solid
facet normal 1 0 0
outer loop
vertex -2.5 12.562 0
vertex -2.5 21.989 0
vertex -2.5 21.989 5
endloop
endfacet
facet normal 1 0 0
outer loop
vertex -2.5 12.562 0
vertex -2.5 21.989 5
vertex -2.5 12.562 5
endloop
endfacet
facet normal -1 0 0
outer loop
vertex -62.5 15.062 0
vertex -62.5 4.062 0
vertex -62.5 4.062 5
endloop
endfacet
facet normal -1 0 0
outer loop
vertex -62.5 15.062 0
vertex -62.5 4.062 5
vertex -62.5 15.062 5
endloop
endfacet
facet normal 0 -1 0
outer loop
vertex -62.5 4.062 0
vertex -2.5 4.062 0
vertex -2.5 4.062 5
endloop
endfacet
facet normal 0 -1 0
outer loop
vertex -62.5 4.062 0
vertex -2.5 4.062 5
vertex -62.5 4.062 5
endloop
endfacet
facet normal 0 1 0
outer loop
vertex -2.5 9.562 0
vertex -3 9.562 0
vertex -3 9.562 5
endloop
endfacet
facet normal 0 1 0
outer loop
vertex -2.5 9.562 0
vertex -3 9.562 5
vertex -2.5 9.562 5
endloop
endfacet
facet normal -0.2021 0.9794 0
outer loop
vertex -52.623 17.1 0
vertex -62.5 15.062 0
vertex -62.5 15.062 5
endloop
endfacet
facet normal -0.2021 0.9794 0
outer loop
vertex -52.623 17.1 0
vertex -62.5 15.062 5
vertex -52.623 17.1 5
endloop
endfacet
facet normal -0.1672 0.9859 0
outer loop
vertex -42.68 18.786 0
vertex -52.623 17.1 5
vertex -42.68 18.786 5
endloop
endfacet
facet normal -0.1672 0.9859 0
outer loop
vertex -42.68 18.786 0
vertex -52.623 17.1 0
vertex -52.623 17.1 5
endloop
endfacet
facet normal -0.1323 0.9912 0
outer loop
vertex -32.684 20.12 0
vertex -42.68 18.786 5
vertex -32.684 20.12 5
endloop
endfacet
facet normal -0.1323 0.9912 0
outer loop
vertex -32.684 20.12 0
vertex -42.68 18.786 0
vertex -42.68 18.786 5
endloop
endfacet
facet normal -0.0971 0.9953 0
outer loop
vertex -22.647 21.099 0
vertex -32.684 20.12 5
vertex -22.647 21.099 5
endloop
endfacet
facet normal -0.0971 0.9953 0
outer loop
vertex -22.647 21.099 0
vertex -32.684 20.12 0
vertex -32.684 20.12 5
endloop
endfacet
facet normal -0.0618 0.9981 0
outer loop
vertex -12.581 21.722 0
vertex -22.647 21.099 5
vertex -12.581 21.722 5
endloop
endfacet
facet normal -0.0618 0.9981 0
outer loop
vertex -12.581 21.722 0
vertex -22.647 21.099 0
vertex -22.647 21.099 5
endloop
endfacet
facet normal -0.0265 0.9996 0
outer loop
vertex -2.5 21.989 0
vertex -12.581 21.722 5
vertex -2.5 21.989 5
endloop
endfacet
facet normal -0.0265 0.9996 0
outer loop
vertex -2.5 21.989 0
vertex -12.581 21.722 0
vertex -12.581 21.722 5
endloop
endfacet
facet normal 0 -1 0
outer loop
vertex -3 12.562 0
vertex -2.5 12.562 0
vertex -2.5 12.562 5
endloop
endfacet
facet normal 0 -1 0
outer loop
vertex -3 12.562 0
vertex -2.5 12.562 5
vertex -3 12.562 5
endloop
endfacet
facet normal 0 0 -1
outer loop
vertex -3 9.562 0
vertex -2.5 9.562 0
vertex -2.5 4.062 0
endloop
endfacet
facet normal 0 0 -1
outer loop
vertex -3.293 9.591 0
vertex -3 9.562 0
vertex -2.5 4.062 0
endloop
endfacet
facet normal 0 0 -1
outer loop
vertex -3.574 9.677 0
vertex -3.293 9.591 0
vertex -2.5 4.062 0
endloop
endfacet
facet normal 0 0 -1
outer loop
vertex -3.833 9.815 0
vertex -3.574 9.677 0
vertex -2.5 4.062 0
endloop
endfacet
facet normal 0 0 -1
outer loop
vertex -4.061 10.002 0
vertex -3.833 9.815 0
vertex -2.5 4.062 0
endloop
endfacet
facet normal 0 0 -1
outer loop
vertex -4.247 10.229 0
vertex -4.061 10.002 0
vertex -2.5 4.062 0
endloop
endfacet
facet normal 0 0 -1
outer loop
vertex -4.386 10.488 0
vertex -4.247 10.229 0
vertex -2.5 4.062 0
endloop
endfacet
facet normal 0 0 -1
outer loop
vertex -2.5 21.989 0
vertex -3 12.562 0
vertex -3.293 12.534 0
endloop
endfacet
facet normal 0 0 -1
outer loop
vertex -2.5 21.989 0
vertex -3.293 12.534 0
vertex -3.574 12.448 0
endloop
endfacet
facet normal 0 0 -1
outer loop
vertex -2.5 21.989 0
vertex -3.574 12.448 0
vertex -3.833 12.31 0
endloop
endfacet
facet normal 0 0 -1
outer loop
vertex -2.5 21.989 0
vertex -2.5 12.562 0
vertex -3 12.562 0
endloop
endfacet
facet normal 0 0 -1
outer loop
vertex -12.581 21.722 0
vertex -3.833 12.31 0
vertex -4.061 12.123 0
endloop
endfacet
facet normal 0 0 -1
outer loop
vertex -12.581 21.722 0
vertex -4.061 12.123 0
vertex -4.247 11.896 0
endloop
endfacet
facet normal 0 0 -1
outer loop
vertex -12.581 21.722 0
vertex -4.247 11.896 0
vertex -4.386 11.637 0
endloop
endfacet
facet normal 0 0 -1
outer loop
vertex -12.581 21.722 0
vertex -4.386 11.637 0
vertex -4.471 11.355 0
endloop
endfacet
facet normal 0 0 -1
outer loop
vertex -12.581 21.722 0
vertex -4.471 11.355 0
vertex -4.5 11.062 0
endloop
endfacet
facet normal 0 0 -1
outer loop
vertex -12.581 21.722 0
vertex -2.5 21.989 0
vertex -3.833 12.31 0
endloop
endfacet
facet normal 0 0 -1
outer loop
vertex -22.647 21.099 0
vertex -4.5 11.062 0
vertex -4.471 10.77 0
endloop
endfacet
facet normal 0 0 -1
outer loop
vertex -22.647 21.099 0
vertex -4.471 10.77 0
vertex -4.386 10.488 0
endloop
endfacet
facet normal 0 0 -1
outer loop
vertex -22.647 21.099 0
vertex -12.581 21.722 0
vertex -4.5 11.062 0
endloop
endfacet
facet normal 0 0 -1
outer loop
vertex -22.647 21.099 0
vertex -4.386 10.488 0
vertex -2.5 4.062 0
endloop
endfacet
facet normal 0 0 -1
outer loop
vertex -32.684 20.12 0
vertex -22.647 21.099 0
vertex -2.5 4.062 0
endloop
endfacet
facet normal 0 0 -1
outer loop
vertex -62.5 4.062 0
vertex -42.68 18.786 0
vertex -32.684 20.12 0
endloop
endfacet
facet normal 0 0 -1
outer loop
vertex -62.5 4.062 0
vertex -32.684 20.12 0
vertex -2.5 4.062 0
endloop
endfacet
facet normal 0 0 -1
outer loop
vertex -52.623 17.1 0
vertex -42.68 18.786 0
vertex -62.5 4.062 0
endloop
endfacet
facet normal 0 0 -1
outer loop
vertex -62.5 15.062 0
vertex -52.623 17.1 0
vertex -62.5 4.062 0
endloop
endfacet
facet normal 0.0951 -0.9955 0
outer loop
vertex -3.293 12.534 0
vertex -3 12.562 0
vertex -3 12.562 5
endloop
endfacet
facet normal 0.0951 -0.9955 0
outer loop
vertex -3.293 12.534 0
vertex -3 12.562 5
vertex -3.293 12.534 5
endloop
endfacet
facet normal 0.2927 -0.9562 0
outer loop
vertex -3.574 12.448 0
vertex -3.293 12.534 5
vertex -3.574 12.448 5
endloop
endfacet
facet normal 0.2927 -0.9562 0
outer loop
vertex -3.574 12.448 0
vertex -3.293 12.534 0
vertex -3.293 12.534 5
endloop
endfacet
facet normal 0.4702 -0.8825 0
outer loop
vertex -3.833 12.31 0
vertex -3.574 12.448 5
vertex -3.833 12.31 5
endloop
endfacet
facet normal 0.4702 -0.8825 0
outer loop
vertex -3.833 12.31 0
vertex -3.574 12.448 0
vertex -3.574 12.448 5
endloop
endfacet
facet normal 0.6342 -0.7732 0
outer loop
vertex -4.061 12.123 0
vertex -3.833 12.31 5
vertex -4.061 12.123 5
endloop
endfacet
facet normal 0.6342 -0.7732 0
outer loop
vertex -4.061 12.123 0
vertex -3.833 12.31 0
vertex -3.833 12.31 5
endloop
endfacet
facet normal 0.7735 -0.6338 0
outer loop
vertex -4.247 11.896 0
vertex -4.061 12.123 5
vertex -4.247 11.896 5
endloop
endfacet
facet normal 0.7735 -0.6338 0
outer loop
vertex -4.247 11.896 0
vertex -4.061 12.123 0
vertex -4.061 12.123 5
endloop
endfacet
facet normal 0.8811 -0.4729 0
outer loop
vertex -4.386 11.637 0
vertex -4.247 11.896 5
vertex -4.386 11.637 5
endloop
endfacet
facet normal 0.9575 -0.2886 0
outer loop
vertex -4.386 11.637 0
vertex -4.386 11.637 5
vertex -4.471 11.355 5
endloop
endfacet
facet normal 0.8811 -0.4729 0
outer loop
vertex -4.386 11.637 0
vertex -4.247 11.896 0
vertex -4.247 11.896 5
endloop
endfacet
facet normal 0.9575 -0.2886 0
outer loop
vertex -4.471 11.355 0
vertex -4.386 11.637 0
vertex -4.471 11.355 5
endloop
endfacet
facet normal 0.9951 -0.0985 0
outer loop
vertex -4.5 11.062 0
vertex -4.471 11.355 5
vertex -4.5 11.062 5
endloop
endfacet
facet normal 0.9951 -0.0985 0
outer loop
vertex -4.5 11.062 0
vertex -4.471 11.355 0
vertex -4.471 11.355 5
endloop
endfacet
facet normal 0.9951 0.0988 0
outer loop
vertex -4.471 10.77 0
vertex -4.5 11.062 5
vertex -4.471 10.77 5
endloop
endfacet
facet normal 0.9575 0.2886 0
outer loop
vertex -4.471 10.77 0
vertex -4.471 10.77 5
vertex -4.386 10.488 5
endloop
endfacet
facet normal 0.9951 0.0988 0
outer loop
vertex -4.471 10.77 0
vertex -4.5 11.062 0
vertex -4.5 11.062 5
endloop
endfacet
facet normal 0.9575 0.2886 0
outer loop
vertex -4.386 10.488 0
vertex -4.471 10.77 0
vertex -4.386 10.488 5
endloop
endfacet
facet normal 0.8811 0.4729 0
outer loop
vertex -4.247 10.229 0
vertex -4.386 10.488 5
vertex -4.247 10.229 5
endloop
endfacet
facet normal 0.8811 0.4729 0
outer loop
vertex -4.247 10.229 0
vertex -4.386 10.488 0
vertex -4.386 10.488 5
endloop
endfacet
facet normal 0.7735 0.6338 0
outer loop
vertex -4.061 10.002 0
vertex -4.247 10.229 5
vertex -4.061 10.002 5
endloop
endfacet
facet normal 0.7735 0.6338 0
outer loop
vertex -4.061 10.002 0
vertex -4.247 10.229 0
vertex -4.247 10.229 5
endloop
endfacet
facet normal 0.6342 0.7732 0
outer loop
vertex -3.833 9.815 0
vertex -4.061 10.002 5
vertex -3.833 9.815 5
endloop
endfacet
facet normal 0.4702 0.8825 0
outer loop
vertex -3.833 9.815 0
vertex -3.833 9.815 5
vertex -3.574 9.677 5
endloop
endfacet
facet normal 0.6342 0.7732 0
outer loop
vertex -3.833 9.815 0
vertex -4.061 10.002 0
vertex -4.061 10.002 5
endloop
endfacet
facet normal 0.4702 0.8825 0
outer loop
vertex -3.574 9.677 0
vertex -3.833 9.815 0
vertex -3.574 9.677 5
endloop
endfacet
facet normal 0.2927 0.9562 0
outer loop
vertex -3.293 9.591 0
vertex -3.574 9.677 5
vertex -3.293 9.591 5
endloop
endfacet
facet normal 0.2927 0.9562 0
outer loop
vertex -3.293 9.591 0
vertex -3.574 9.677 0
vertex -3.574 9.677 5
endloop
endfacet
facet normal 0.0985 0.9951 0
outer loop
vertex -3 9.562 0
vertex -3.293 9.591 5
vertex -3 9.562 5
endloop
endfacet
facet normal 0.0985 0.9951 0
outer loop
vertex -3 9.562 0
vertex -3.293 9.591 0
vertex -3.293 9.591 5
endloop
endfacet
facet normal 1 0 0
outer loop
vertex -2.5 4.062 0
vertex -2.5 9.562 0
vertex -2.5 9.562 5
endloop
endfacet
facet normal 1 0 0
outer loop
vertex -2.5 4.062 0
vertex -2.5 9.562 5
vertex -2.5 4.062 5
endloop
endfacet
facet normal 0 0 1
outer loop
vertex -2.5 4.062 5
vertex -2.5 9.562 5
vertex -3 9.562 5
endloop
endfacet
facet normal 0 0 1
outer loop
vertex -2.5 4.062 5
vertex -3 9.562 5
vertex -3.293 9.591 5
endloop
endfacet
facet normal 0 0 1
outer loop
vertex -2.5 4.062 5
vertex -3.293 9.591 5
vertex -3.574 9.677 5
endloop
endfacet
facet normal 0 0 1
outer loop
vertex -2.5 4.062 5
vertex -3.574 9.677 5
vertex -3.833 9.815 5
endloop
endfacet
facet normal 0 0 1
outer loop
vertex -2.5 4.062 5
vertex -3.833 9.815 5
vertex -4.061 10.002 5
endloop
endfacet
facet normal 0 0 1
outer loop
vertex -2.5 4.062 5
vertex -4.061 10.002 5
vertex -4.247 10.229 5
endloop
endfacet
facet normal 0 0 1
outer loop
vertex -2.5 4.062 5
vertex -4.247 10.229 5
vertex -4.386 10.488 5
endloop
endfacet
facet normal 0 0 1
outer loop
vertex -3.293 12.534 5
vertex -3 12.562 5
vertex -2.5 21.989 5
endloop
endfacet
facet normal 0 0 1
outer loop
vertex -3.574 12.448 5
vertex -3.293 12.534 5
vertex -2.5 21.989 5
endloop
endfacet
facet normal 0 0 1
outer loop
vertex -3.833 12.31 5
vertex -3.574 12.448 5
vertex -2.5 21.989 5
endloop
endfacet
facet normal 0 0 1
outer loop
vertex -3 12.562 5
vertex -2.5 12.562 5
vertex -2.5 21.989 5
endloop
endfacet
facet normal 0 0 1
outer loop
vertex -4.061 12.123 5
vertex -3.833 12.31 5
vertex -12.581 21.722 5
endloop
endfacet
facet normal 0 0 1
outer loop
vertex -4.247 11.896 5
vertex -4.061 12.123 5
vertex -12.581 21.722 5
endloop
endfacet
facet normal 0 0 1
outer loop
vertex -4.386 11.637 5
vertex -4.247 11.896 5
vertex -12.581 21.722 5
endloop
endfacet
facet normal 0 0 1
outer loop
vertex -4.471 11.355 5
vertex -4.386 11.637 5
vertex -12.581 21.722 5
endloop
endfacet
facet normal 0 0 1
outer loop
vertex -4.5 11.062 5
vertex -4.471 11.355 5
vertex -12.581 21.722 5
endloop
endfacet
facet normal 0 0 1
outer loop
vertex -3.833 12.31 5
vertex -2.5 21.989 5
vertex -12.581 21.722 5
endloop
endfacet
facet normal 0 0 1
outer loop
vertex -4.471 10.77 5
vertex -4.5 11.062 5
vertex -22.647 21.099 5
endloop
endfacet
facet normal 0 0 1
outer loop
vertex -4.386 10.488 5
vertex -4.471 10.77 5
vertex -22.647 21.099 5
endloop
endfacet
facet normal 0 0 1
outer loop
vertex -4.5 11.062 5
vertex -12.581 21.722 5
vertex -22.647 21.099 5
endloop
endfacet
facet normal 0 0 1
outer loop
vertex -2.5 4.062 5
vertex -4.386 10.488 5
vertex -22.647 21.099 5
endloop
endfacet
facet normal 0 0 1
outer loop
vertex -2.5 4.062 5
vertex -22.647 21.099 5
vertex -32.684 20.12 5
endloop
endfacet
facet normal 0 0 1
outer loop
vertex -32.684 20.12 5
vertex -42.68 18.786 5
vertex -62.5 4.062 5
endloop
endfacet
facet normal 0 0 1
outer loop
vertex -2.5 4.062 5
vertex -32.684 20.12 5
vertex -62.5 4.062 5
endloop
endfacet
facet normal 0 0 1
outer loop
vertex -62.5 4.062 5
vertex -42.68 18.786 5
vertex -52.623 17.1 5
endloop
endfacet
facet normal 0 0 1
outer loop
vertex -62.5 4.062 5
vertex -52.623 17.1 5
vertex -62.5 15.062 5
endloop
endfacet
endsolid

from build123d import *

# Parameters (mm, degrees)
EXTRUDE_1_DEPTH = 5


with BuildPart() as part:
    # Эскиз1 → Бобышка-Вытянуть1 (new body)
    with BuildSketch(Plane.XY):
        with BuildLine():
            ThreePointArc((-3, 12.562492976), (-4.5, 11.062492976), (-3, 9.562492976))
            Line((-3, 9.562492976), (-2.5, 9.562492976))
            Line((-2.5, 9.562492976), (-2.5, 4.062492976))
            Line((-2.5, 4.062492976), (-6, 4.062492976))
            Line((-6, 4.062492976), (-62.5, 4.062492976))
            Line((-62.5, 4.062492976), (-62.5, 15.062492976))
            ThreePointArc((-62.5, 15.062492976), (-32.684005961, 20.119684505), (-2.5, 21.989034877))
            Line((-2.5, 21.989034877), (-2.5, 12.562492976))
            Line((-2.5, 12.562492976), (-3, 12.562492976))
        make_face()
    extrude(amount=EXTRUDE_1_DEPTH)


solid = part.part
